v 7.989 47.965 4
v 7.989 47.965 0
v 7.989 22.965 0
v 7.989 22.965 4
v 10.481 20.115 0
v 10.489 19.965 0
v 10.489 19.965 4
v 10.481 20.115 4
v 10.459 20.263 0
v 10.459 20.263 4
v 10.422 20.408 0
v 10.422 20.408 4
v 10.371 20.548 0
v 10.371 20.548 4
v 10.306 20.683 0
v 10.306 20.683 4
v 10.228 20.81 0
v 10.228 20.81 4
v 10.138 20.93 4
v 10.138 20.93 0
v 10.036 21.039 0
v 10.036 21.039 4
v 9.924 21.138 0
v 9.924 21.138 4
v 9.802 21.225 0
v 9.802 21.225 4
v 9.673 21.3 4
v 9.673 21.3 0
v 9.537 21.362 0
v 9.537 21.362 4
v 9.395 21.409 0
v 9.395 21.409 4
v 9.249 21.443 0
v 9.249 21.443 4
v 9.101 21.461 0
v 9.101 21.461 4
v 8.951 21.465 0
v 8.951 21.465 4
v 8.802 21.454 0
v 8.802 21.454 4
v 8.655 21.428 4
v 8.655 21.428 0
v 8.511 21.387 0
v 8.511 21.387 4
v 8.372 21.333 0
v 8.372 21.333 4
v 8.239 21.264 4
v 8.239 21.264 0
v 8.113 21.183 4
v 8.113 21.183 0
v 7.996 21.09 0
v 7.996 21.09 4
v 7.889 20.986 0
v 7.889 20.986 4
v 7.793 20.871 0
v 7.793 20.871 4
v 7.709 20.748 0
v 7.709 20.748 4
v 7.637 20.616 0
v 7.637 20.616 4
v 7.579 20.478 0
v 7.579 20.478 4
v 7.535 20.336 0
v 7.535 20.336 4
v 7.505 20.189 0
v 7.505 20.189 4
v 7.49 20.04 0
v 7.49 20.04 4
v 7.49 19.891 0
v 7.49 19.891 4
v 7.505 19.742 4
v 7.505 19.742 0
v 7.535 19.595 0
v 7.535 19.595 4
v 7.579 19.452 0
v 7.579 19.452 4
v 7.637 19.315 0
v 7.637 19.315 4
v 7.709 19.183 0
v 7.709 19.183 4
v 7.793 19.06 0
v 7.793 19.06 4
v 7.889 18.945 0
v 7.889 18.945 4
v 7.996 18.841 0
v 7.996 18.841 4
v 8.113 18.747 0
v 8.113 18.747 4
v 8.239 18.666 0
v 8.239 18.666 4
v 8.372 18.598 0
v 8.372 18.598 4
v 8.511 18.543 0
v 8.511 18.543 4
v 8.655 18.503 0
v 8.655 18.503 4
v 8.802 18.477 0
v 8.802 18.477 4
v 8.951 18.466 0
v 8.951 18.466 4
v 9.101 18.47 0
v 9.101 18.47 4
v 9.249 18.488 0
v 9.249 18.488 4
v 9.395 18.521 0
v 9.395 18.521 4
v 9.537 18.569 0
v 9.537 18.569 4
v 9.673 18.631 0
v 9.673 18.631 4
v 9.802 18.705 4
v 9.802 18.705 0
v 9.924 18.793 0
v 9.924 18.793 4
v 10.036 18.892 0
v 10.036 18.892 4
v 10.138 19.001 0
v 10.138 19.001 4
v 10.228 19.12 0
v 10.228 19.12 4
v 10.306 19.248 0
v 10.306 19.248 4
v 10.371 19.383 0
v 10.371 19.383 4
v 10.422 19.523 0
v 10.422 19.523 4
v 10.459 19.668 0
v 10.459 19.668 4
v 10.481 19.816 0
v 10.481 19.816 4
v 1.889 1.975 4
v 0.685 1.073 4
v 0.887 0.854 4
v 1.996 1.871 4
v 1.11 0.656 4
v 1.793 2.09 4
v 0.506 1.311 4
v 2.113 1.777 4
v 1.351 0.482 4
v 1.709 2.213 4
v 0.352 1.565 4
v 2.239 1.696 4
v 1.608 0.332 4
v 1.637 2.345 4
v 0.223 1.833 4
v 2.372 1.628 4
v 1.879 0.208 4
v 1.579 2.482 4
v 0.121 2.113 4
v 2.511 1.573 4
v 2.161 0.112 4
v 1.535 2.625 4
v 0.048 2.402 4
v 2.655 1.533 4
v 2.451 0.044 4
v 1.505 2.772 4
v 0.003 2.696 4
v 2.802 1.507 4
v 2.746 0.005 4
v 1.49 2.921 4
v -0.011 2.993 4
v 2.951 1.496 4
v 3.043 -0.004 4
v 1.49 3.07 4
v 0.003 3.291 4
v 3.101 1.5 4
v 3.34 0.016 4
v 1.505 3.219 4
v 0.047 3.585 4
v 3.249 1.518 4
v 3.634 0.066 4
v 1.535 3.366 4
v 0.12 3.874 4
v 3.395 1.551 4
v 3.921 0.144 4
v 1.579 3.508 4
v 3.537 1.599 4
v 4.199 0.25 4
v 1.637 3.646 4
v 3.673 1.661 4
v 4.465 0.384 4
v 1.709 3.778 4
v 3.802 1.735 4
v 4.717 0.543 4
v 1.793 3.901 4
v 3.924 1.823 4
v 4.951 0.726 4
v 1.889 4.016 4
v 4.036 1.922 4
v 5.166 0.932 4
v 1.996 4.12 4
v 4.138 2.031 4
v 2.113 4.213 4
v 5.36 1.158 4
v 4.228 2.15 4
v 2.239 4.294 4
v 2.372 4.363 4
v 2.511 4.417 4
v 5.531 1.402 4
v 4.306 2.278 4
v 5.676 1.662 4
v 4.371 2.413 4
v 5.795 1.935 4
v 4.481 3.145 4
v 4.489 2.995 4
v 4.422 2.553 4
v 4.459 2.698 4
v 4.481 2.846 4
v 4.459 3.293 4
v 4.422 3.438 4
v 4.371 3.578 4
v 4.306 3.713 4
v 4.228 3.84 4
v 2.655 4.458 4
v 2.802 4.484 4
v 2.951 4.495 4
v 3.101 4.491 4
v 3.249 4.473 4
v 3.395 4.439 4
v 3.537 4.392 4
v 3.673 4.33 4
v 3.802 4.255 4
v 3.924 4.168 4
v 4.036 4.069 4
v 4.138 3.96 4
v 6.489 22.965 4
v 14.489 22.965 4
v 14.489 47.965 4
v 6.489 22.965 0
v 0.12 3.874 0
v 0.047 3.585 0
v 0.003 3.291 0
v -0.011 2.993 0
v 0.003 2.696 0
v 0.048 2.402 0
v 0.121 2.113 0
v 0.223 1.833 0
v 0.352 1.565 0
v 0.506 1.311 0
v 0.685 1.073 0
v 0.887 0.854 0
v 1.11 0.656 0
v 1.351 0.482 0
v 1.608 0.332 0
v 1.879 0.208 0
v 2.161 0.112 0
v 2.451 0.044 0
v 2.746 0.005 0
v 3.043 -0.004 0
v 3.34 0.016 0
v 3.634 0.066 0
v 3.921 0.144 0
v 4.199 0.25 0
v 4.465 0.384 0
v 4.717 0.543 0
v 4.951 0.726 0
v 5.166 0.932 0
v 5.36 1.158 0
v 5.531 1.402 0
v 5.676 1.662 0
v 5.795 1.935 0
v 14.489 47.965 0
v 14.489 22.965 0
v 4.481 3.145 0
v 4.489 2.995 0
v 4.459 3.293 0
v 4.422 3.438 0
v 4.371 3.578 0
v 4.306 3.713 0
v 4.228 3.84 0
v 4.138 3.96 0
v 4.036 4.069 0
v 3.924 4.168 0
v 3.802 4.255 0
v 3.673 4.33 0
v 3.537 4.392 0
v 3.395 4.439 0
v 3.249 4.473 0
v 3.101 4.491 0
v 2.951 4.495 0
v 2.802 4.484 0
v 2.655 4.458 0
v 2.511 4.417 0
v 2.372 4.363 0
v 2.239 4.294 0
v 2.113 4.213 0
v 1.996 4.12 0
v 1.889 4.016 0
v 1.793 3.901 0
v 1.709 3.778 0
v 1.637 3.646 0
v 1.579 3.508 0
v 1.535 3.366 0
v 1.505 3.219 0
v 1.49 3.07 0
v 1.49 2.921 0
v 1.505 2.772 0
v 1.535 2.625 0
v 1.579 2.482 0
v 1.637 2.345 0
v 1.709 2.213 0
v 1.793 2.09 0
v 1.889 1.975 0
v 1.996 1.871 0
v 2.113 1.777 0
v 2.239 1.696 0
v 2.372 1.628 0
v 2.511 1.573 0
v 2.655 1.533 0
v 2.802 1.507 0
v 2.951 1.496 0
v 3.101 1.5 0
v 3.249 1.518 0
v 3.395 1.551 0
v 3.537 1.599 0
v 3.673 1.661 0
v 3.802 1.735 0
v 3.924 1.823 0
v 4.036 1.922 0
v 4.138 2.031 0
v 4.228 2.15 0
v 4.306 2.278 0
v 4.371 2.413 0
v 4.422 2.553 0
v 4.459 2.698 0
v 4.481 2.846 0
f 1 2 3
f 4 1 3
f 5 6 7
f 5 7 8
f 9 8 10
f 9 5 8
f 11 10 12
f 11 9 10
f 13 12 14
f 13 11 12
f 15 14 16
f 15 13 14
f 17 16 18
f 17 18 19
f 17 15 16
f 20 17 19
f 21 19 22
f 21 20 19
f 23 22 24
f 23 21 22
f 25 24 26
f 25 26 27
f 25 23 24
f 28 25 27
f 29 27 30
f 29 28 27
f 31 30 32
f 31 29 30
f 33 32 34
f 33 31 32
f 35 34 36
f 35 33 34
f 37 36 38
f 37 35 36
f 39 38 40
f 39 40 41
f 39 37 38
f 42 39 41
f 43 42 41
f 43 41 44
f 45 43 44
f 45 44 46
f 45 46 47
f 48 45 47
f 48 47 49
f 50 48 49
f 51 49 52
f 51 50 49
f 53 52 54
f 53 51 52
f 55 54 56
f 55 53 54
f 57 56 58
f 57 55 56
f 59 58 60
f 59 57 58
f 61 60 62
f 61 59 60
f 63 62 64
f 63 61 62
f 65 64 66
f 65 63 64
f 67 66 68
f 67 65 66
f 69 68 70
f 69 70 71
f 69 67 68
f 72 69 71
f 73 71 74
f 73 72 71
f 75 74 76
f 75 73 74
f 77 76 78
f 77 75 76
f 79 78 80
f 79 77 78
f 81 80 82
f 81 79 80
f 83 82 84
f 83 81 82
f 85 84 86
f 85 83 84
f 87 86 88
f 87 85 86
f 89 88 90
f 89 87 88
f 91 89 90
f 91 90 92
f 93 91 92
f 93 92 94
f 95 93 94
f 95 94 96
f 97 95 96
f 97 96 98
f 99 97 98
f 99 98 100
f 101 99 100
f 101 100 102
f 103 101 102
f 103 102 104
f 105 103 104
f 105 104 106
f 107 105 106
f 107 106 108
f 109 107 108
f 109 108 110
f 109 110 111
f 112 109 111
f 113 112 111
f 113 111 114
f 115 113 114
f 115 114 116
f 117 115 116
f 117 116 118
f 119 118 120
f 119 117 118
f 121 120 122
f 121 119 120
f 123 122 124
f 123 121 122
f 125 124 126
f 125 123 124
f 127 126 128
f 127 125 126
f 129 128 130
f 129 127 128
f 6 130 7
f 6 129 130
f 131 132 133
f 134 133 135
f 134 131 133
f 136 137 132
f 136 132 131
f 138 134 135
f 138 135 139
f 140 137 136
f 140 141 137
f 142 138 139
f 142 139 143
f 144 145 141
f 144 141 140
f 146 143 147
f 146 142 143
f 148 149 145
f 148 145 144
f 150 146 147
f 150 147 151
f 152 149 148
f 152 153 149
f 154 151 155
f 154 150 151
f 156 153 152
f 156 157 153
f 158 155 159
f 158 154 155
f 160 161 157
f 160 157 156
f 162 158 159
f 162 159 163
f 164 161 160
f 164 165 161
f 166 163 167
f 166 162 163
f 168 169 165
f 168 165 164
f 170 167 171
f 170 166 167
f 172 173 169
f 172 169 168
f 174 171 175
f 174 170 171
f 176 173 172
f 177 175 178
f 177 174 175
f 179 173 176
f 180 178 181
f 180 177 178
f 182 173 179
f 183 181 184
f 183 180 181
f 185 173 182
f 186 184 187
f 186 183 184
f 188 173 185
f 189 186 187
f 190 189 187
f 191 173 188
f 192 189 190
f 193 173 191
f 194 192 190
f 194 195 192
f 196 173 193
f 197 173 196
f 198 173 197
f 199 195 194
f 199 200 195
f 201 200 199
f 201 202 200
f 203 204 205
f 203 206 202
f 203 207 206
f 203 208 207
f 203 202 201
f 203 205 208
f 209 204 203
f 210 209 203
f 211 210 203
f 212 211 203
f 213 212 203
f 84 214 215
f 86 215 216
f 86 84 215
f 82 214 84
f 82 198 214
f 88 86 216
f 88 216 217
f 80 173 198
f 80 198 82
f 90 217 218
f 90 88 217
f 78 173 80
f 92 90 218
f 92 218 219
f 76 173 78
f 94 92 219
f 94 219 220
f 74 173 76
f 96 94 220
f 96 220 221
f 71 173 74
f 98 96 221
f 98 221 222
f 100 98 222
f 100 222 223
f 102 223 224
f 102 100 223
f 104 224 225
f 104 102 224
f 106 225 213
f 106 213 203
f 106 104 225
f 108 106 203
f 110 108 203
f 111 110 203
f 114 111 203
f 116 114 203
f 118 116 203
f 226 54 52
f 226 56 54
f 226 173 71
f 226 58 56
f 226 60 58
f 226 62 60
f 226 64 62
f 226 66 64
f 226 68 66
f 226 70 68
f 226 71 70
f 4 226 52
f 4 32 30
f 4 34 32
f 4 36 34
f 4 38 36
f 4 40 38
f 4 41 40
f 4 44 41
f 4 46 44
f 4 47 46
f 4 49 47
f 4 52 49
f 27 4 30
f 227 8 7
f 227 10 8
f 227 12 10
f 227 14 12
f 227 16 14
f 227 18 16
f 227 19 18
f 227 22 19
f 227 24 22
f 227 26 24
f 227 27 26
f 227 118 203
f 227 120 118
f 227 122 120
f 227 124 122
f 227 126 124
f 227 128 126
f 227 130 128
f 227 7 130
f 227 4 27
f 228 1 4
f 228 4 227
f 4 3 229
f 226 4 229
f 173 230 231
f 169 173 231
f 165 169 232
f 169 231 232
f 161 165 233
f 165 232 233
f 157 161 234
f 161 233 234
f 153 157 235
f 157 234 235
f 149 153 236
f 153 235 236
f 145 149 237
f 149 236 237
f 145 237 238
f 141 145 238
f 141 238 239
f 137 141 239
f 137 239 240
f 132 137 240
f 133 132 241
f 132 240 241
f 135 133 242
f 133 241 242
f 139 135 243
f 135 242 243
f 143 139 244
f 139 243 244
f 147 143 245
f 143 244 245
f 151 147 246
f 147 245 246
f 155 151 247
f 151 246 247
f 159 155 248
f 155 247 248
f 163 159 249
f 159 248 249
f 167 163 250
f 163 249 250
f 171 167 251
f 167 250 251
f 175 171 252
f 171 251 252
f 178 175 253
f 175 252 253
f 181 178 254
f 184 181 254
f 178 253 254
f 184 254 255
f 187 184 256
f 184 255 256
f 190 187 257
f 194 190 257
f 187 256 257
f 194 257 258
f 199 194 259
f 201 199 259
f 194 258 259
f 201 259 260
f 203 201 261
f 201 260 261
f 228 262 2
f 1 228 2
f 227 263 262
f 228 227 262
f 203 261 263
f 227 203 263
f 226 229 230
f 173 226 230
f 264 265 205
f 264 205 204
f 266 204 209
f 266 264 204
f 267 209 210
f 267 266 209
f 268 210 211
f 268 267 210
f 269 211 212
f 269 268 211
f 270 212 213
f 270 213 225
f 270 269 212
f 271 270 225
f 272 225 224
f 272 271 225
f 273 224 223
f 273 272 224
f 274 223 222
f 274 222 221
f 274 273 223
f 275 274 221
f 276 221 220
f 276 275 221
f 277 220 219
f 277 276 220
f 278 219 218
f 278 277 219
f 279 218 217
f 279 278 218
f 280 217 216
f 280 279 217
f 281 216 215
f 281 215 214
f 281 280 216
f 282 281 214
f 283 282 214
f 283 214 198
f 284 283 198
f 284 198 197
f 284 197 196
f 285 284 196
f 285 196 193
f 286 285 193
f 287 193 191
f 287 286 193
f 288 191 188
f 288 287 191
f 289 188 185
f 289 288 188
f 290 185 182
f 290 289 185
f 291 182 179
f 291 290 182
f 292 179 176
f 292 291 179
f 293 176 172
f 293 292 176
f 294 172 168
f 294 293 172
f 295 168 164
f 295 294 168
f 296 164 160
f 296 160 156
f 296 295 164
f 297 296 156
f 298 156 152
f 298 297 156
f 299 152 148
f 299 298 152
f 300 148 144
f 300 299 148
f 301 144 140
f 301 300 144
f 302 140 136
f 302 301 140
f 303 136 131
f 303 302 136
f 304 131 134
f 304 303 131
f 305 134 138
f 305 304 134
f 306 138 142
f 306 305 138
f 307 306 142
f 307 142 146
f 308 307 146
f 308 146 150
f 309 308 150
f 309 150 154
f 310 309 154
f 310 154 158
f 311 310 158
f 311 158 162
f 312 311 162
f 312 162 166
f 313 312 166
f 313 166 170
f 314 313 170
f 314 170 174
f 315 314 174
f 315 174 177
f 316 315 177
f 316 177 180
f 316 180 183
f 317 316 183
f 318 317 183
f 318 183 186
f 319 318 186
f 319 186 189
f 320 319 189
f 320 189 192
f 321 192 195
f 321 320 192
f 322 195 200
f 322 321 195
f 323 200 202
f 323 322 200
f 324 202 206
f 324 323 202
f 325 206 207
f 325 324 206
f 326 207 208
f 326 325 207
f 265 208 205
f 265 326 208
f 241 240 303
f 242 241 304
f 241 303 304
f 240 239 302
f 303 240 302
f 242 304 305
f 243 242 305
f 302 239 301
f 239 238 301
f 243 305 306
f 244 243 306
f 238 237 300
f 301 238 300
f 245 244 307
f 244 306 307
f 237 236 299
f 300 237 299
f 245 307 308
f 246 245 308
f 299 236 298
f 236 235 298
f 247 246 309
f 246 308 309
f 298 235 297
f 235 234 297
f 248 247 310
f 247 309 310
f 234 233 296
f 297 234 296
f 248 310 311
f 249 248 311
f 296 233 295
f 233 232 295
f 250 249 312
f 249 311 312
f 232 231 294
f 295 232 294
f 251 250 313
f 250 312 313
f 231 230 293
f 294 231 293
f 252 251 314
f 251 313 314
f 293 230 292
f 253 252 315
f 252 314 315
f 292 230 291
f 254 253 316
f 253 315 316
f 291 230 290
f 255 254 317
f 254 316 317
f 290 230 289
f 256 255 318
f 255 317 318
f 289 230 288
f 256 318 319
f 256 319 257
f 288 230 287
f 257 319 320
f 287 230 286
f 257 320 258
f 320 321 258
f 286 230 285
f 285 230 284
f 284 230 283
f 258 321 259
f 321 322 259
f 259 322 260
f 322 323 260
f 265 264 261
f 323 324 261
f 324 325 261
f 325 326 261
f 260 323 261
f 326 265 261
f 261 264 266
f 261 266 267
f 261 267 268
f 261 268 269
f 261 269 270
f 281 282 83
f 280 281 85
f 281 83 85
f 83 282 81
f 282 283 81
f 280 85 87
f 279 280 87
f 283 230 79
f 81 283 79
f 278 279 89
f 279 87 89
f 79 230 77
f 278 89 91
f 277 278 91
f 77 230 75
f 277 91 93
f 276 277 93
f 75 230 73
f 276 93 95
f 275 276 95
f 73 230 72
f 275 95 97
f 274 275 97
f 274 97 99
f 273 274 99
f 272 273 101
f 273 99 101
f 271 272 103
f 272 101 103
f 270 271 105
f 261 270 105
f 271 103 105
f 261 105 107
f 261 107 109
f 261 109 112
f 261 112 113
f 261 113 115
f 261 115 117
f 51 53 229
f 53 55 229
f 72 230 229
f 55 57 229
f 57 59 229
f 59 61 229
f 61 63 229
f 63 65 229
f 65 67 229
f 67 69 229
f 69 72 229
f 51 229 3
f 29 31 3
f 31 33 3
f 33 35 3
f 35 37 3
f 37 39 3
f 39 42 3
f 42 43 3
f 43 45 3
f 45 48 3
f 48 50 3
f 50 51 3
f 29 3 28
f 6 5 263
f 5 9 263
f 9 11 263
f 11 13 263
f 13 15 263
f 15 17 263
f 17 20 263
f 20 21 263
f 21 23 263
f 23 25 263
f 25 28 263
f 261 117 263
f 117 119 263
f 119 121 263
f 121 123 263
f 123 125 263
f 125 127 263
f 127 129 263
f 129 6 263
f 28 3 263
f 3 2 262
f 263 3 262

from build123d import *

# Parameters (mm, degrees)
SKETCH1_R           = 1.5
BOSS_EXTRUDE1_DEPTH = 4


with BuildPart() as part:
    # Sketch1 → Boss-Extrude1 (new body)
    with BuildSketch(Plane.XY):
        with BuildLine():
            Line((14.488514014, 22.965384222), (14.488514014, 47.965384222))
            Line((14.488514014, 47.965384222), (7.988514014, 47.965384222))
            Line((7.988514014, 47.965384222), (7.988514014, 22.965384222))
            Line((7.988514014, 22.965384222), (6.488514014, 22.965384222))
            Line((6.488514014, 22.965384222), (0.12000074, 3.87380986))
            ThreePointArc((0.12000074, 3.87380986), (2.018608705, 0.156496466), (5.794859705, 1.93499568))
            Line((5.794859705, 1.93499568), (14.488514014, 22.965384222))
        make_face()
        with Locations((2.988514014, 2.995384222)):
            Circle(SKETCH1_R, mode=Mode.SUBTRACT)
        with Locations((8.988514014, 19.965384222)):
            Circle(SKETCH1_R, mode=Mode.SUBTRACT)
    extrude(amount=BOSS_EXTRUDE1_DEPTH)


solid = part.part
